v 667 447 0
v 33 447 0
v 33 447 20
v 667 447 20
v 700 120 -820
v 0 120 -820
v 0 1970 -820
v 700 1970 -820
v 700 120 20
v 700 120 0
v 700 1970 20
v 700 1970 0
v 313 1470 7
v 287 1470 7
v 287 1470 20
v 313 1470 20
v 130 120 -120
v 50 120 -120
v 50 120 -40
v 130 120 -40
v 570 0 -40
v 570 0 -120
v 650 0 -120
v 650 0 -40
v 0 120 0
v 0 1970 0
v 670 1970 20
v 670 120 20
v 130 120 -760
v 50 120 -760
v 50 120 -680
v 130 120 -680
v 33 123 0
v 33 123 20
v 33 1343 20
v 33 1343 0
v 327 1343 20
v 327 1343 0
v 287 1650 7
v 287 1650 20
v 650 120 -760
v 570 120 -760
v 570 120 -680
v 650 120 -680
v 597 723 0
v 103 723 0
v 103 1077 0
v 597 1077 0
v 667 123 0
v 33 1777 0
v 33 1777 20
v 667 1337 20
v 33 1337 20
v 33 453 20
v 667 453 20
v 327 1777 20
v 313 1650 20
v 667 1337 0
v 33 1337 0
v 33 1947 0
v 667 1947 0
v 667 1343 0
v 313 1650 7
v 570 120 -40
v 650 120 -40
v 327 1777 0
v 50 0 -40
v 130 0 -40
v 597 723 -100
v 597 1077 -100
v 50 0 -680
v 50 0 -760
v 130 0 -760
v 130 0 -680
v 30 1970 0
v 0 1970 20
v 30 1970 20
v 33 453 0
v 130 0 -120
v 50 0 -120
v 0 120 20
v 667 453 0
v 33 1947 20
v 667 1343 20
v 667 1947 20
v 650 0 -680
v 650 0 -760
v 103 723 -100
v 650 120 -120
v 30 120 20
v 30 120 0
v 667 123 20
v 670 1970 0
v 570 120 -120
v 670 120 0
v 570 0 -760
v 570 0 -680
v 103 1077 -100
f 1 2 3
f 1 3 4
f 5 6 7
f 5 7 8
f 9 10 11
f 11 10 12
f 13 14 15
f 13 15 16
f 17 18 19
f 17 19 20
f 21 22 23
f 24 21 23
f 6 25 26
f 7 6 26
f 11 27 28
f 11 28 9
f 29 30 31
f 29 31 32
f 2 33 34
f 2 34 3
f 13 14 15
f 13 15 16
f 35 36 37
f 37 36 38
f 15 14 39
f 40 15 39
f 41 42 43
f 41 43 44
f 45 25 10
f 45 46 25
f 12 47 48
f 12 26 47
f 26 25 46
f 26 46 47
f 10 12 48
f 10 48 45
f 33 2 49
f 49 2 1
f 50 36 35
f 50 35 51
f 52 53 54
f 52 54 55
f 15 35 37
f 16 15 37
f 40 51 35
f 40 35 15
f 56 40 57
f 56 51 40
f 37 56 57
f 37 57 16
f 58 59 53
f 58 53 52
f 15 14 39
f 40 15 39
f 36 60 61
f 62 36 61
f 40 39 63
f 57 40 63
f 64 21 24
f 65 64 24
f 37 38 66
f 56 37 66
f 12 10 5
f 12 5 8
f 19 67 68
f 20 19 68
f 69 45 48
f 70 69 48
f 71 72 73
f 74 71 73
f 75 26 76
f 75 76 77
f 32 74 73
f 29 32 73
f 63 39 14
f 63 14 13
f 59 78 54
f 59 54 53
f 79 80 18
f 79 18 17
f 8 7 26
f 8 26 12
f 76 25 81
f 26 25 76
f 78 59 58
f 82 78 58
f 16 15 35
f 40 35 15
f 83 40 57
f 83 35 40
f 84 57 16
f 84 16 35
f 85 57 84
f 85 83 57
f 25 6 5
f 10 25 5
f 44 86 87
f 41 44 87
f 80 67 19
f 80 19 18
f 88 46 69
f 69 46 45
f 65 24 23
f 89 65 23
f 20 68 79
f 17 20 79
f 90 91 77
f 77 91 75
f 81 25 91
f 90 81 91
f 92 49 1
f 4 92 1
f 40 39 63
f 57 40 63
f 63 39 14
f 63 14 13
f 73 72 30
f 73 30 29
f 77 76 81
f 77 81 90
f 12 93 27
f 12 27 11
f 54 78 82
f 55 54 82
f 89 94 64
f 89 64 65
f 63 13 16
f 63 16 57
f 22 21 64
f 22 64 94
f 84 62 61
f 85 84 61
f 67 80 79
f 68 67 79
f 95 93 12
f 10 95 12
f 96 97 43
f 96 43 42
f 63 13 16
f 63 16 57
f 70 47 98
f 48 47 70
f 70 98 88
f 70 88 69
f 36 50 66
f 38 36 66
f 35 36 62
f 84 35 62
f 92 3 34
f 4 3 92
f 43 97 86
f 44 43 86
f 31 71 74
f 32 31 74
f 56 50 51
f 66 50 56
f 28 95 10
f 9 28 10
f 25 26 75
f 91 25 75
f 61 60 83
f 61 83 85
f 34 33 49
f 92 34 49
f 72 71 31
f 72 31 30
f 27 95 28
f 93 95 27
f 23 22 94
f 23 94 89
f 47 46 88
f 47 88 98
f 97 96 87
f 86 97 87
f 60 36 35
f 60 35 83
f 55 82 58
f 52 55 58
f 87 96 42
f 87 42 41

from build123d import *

# Parameters (mm, degrees)
SKETCH1_W                 = 700
SKETCH1_H                 = 1850
GOVDE_KASA_DEPTH          = 820
SKETCH2_W                 = 80
SKETCH2_H                 = 80
AYAK_1_DEPTH              = 120
SKETCH3_W                 = 80
SKETCH3_H                 = 80
AYAK_2_DEPTH              = 120
SKETCH4_W                 = 80
SKETCH4_H                 = 80
AYAK_3_DEPTH              = 120
SKETCH5_W                 = 80
SKETCH5_H                 = 80
AYAK_4_DEPTH              = 120
SKETCH6_W                 = 30
SKETCH6_H                 = 1850
SOVE_SOL_DEPTH            = 20
SKETCH7_W                 = 30
SKETCH7_H                 = 1850
SOVE_SAG_DEPTH            = 20
SKETCH8_W                 = 634
SKETCH8_H                 = 604
PANEL_UST_DEPTH           = 20
SKETCH9_W                 = 294
SKETCH9_H                 = 434
KAPAK_PANO_UST_DEPTH      = 20
KAPAK_PANO_UST_KULP_START = 7
SKETCH10_W                = 26
SKETCH10_H                = 180
KAPAK_PANO_UST_KULP_DEPTH = 13
SKETCH11_W                = 634
SKETCH11_H                = 884
PANEL_ORTA_DEPTH          = 20
SKETCH12_W                = 494
SKETCH12_H                = 354
ACIKLIK_TEPSI_DEPTH       = 100
SKETCH13_W                = 634
SKETCH13_H                = 324
PANEL_ALT_DEPTH           = 20


with BuildPart() as part:
    # Sketch1 → govde_kasa (new body)
    with BuildSketch(Plane.XY):
        with Locations((350, 1045)):
            Rectangle(SKETCH1_W, SKETCH1_H)
    extrude(amount=-GOVDE_KASA_DEPTH)

    # Sketch12 → aciklik_tepsi (cut)
    with BuildSketch(Plane.XY):
        with Locations((350, 900)):
            Rectangle(SKETCH12_W, SKETCH12_H)
    extrude(amount=-ACIKLIK_TEPSI_DEPTH, mode=Mode.SUBTRACT)


with BuildPart() as body_2:
    # Sketch2 → ayak_1 (new body)
    with BuildSketch(Plane(origin=(0, 0, 0), x_dir=(1, 0, 0), z_dir=(0, 1, 0))):
        with Locations((90, 80)):
            Rectangle(SKETCH2_W, SKETCH2_H)
    extrude(amount=AYAK_1_DEPTH)


with BuildPart() as body_3:
    # Sketch3 → ayak_2 (new body)
    with BuildSketch(Plane(origin=(0, 0, 0), x_dir=(1, 0, 0), z_dir=(0, 1, 0))):
        with Locations((610, 80)):
            Rectangle(SKETCH3_W, SKETCH3_H)
    extrude(amount=AYAK_2_DEPTH)


with BuildPart() as body_4:
    # Sketch4 → ayak_3 (new body)
    with BuildSketch(Plane(origin=(0, 0, 0), x_dir=(1, 0, 0), z_dir=(0, 1, 0))):
        with Locations((90, 720)):
            Rectangle(SKETCH4_W, SKETCH4_H)
    extrude(amount=AYAK_3_DEPTH)


with BuildPart() as body_5:
    # Sketch5 → ayak_4 (new body)
    with BuildSketch(Plane(origin=(0, 0, 0), x_dir=(1, 0, 0), z_dir=(0, 1, 0))):
        with Locations((610, 720)):
            Rectangle(SKETCH5_W, SKETCH5_H)
    extrude(amount=AYAK_4_DEPTH)


with BuildPart() as body_6:
    # Sketch6 → sove_sol (new body)
    with BuildSketch(Plane.XY):
        with Locations((15, 1045)):
            Rectangle(SKETCH6_W, SKETCH6_H)
    extrude(amount=SOVE_SOL_DEPTH)


with BuildPart() as body_7:
    # Sketch7 → sove_sag (new body)
    with BuildSketch(Plane.XY):
        with Locations((685, 1045)):
            Rectangle(SKETCH7_W, SKETCH7_H)
    extrude(amount=SOVE_SAG_DEPTH)


with BuildPart() as body_8:
    # Sketch8 → panel_ust (new body)
    with BuildSketch(Plane.XY):
        with Locations((350, 1645)):
            Rectangle(SKETCH8_W, SKETCH8_H)
    extrude(amount=PANEL_UST_DEPTH)


with BuildPart() as body_9:
    # Sketch9 → kapak_pano_ust (new body)
    with BuildSketch(Plane.XY):
        with Locations((180, 1560)):
            Rectangle(SKETCH9_W, SKETCH9_H)
    extrude(amount=KAPAK_PANO_UST_DEPTH)


with BuildPart() as kapak_pano_ust_kulp_tool:
    # Sketch10 → kapak_pano_ust_kulp (new body)
    with BuildSketch(Plane.XY.offset(KAPAK_PANO_UST_KULP_START)):
        with Locations((300, 1560)):
            Rectangle(SKETCH10_W, SKETCH10_H)
    extrude(amount=KAPAK_PANO_UST_KULP_DEPTH)


with BuildPart() as body_8_1:
    add(body_8.part)

    # kapak_pano_ust_kulp: cut by kapak_pano_ust_kulp_tool
    add(kapak_pano_ust_kulp_tool.part, mode=Mode.SUBTRACT)


with BuildPart() as body_9_1:
    add(body_9.part)

    # kapak_pano_ust_kulp: cut by kapak_pano_ust_kulp_tool
    add(kapak_pano_ust_kulp_tool.part, mode=Mode.SUBTRACT)


with BuildPart() as body_10:
    # Sketch11 → panel_orta (new body)
    with BuildSketch(Plane.XY):
        with Locations((350, 895)):
            Rectangle(SKETCH11_W, SKETCH11_H)
    extrude(amount=PANEL_ORTA_DEPTH)


with BuildPart() as body_11:
    # Sketch13 → panel_alt (new body)
    with BuildSketch(Plane.XY):
        with Locations((350, 285)):
            Rectangle(SKETCH13_W, SKETCH13_H)
    extrude(amount=PANEL_ALT_DEPTH)


solid = Compound([part.part, body_2.part, body_3.part, body_4.part, body_5.part, body_6.part, body_7.part, body_8_1.part, body_9_1.part, body_10.part, body_11.part])
